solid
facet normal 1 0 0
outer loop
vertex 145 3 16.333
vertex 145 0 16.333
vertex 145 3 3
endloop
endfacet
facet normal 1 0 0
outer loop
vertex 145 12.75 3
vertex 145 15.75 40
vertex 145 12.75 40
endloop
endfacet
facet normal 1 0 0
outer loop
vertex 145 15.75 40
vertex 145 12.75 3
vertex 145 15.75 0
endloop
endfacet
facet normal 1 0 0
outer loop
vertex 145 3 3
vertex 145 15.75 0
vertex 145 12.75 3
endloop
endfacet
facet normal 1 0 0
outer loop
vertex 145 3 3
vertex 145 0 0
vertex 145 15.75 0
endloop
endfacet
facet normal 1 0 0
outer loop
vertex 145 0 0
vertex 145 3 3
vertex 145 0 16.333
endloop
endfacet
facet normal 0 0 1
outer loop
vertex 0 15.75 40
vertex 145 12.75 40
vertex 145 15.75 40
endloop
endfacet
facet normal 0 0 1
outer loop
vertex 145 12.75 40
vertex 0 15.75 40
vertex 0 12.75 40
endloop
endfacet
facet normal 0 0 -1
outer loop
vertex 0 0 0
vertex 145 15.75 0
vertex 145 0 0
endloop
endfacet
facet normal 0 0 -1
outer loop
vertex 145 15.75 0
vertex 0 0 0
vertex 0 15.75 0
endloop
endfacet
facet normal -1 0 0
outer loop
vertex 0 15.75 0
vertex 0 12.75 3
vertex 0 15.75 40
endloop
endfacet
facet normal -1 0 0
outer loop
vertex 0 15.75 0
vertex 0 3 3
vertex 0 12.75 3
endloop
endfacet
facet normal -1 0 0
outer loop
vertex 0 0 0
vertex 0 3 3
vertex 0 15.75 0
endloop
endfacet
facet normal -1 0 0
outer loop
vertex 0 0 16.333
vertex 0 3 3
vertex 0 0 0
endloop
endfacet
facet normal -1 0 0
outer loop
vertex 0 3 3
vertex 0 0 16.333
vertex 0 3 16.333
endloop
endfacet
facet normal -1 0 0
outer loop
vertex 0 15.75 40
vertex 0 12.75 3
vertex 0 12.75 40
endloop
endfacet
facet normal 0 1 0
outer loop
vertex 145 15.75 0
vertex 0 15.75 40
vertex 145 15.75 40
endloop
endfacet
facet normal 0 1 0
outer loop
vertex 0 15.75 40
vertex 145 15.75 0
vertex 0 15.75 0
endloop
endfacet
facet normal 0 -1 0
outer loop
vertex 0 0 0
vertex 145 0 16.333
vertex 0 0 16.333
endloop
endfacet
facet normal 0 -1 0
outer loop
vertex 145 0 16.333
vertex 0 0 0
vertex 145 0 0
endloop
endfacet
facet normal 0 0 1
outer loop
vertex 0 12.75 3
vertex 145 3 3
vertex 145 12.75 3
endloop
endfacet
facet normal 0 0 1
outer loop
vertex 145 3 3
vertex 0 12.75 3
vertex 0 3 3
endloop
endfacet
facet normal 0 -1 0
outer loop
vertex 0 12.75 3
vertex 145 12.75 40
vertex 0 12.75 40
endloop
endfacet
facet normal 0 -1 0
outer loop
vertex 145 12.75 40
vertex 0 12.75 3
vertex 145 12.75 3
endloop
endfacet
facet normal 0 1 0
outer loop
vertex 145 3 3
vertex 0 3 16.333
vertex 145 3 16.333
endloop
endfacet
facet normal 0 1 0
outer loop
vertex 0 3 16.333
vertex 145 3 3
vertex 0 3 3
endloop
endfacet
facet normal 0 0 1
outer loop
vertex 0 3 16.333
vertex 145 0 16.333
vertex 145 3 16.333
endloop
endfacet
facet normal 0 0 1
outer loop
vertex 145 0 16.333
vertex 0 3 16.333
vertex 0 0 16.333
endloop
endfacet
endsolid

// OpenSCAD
deviceThickness = 9.75;
holderThickness = 3;
holderWidth = 145; // Make this wider if your printer build volume allows it!
holderHeight = 40;

module holder() {
	cube([holderWidth, deviceThickness + (holderThickness * 2), holderHeight]);
}

module deviceCutOut() {
	translate([-holderWidth * 0.25, holderThickness, holderThickness])
	cube([holderWidth * 1.5, deviceThickness, holderHeight]);	
}

module frontLip() {
	translate([-holderWidth * 0.25, -holderThickness * 2, holderThickness + (holderHeight / 3)])
	cube([holderWidth * 1.5, deviceThickness, holderHeight]);	
}

difference() {
	difference() {
		difference() {
			holder();
			deviceCutOut();
		}

		frontLip();
	}
}
